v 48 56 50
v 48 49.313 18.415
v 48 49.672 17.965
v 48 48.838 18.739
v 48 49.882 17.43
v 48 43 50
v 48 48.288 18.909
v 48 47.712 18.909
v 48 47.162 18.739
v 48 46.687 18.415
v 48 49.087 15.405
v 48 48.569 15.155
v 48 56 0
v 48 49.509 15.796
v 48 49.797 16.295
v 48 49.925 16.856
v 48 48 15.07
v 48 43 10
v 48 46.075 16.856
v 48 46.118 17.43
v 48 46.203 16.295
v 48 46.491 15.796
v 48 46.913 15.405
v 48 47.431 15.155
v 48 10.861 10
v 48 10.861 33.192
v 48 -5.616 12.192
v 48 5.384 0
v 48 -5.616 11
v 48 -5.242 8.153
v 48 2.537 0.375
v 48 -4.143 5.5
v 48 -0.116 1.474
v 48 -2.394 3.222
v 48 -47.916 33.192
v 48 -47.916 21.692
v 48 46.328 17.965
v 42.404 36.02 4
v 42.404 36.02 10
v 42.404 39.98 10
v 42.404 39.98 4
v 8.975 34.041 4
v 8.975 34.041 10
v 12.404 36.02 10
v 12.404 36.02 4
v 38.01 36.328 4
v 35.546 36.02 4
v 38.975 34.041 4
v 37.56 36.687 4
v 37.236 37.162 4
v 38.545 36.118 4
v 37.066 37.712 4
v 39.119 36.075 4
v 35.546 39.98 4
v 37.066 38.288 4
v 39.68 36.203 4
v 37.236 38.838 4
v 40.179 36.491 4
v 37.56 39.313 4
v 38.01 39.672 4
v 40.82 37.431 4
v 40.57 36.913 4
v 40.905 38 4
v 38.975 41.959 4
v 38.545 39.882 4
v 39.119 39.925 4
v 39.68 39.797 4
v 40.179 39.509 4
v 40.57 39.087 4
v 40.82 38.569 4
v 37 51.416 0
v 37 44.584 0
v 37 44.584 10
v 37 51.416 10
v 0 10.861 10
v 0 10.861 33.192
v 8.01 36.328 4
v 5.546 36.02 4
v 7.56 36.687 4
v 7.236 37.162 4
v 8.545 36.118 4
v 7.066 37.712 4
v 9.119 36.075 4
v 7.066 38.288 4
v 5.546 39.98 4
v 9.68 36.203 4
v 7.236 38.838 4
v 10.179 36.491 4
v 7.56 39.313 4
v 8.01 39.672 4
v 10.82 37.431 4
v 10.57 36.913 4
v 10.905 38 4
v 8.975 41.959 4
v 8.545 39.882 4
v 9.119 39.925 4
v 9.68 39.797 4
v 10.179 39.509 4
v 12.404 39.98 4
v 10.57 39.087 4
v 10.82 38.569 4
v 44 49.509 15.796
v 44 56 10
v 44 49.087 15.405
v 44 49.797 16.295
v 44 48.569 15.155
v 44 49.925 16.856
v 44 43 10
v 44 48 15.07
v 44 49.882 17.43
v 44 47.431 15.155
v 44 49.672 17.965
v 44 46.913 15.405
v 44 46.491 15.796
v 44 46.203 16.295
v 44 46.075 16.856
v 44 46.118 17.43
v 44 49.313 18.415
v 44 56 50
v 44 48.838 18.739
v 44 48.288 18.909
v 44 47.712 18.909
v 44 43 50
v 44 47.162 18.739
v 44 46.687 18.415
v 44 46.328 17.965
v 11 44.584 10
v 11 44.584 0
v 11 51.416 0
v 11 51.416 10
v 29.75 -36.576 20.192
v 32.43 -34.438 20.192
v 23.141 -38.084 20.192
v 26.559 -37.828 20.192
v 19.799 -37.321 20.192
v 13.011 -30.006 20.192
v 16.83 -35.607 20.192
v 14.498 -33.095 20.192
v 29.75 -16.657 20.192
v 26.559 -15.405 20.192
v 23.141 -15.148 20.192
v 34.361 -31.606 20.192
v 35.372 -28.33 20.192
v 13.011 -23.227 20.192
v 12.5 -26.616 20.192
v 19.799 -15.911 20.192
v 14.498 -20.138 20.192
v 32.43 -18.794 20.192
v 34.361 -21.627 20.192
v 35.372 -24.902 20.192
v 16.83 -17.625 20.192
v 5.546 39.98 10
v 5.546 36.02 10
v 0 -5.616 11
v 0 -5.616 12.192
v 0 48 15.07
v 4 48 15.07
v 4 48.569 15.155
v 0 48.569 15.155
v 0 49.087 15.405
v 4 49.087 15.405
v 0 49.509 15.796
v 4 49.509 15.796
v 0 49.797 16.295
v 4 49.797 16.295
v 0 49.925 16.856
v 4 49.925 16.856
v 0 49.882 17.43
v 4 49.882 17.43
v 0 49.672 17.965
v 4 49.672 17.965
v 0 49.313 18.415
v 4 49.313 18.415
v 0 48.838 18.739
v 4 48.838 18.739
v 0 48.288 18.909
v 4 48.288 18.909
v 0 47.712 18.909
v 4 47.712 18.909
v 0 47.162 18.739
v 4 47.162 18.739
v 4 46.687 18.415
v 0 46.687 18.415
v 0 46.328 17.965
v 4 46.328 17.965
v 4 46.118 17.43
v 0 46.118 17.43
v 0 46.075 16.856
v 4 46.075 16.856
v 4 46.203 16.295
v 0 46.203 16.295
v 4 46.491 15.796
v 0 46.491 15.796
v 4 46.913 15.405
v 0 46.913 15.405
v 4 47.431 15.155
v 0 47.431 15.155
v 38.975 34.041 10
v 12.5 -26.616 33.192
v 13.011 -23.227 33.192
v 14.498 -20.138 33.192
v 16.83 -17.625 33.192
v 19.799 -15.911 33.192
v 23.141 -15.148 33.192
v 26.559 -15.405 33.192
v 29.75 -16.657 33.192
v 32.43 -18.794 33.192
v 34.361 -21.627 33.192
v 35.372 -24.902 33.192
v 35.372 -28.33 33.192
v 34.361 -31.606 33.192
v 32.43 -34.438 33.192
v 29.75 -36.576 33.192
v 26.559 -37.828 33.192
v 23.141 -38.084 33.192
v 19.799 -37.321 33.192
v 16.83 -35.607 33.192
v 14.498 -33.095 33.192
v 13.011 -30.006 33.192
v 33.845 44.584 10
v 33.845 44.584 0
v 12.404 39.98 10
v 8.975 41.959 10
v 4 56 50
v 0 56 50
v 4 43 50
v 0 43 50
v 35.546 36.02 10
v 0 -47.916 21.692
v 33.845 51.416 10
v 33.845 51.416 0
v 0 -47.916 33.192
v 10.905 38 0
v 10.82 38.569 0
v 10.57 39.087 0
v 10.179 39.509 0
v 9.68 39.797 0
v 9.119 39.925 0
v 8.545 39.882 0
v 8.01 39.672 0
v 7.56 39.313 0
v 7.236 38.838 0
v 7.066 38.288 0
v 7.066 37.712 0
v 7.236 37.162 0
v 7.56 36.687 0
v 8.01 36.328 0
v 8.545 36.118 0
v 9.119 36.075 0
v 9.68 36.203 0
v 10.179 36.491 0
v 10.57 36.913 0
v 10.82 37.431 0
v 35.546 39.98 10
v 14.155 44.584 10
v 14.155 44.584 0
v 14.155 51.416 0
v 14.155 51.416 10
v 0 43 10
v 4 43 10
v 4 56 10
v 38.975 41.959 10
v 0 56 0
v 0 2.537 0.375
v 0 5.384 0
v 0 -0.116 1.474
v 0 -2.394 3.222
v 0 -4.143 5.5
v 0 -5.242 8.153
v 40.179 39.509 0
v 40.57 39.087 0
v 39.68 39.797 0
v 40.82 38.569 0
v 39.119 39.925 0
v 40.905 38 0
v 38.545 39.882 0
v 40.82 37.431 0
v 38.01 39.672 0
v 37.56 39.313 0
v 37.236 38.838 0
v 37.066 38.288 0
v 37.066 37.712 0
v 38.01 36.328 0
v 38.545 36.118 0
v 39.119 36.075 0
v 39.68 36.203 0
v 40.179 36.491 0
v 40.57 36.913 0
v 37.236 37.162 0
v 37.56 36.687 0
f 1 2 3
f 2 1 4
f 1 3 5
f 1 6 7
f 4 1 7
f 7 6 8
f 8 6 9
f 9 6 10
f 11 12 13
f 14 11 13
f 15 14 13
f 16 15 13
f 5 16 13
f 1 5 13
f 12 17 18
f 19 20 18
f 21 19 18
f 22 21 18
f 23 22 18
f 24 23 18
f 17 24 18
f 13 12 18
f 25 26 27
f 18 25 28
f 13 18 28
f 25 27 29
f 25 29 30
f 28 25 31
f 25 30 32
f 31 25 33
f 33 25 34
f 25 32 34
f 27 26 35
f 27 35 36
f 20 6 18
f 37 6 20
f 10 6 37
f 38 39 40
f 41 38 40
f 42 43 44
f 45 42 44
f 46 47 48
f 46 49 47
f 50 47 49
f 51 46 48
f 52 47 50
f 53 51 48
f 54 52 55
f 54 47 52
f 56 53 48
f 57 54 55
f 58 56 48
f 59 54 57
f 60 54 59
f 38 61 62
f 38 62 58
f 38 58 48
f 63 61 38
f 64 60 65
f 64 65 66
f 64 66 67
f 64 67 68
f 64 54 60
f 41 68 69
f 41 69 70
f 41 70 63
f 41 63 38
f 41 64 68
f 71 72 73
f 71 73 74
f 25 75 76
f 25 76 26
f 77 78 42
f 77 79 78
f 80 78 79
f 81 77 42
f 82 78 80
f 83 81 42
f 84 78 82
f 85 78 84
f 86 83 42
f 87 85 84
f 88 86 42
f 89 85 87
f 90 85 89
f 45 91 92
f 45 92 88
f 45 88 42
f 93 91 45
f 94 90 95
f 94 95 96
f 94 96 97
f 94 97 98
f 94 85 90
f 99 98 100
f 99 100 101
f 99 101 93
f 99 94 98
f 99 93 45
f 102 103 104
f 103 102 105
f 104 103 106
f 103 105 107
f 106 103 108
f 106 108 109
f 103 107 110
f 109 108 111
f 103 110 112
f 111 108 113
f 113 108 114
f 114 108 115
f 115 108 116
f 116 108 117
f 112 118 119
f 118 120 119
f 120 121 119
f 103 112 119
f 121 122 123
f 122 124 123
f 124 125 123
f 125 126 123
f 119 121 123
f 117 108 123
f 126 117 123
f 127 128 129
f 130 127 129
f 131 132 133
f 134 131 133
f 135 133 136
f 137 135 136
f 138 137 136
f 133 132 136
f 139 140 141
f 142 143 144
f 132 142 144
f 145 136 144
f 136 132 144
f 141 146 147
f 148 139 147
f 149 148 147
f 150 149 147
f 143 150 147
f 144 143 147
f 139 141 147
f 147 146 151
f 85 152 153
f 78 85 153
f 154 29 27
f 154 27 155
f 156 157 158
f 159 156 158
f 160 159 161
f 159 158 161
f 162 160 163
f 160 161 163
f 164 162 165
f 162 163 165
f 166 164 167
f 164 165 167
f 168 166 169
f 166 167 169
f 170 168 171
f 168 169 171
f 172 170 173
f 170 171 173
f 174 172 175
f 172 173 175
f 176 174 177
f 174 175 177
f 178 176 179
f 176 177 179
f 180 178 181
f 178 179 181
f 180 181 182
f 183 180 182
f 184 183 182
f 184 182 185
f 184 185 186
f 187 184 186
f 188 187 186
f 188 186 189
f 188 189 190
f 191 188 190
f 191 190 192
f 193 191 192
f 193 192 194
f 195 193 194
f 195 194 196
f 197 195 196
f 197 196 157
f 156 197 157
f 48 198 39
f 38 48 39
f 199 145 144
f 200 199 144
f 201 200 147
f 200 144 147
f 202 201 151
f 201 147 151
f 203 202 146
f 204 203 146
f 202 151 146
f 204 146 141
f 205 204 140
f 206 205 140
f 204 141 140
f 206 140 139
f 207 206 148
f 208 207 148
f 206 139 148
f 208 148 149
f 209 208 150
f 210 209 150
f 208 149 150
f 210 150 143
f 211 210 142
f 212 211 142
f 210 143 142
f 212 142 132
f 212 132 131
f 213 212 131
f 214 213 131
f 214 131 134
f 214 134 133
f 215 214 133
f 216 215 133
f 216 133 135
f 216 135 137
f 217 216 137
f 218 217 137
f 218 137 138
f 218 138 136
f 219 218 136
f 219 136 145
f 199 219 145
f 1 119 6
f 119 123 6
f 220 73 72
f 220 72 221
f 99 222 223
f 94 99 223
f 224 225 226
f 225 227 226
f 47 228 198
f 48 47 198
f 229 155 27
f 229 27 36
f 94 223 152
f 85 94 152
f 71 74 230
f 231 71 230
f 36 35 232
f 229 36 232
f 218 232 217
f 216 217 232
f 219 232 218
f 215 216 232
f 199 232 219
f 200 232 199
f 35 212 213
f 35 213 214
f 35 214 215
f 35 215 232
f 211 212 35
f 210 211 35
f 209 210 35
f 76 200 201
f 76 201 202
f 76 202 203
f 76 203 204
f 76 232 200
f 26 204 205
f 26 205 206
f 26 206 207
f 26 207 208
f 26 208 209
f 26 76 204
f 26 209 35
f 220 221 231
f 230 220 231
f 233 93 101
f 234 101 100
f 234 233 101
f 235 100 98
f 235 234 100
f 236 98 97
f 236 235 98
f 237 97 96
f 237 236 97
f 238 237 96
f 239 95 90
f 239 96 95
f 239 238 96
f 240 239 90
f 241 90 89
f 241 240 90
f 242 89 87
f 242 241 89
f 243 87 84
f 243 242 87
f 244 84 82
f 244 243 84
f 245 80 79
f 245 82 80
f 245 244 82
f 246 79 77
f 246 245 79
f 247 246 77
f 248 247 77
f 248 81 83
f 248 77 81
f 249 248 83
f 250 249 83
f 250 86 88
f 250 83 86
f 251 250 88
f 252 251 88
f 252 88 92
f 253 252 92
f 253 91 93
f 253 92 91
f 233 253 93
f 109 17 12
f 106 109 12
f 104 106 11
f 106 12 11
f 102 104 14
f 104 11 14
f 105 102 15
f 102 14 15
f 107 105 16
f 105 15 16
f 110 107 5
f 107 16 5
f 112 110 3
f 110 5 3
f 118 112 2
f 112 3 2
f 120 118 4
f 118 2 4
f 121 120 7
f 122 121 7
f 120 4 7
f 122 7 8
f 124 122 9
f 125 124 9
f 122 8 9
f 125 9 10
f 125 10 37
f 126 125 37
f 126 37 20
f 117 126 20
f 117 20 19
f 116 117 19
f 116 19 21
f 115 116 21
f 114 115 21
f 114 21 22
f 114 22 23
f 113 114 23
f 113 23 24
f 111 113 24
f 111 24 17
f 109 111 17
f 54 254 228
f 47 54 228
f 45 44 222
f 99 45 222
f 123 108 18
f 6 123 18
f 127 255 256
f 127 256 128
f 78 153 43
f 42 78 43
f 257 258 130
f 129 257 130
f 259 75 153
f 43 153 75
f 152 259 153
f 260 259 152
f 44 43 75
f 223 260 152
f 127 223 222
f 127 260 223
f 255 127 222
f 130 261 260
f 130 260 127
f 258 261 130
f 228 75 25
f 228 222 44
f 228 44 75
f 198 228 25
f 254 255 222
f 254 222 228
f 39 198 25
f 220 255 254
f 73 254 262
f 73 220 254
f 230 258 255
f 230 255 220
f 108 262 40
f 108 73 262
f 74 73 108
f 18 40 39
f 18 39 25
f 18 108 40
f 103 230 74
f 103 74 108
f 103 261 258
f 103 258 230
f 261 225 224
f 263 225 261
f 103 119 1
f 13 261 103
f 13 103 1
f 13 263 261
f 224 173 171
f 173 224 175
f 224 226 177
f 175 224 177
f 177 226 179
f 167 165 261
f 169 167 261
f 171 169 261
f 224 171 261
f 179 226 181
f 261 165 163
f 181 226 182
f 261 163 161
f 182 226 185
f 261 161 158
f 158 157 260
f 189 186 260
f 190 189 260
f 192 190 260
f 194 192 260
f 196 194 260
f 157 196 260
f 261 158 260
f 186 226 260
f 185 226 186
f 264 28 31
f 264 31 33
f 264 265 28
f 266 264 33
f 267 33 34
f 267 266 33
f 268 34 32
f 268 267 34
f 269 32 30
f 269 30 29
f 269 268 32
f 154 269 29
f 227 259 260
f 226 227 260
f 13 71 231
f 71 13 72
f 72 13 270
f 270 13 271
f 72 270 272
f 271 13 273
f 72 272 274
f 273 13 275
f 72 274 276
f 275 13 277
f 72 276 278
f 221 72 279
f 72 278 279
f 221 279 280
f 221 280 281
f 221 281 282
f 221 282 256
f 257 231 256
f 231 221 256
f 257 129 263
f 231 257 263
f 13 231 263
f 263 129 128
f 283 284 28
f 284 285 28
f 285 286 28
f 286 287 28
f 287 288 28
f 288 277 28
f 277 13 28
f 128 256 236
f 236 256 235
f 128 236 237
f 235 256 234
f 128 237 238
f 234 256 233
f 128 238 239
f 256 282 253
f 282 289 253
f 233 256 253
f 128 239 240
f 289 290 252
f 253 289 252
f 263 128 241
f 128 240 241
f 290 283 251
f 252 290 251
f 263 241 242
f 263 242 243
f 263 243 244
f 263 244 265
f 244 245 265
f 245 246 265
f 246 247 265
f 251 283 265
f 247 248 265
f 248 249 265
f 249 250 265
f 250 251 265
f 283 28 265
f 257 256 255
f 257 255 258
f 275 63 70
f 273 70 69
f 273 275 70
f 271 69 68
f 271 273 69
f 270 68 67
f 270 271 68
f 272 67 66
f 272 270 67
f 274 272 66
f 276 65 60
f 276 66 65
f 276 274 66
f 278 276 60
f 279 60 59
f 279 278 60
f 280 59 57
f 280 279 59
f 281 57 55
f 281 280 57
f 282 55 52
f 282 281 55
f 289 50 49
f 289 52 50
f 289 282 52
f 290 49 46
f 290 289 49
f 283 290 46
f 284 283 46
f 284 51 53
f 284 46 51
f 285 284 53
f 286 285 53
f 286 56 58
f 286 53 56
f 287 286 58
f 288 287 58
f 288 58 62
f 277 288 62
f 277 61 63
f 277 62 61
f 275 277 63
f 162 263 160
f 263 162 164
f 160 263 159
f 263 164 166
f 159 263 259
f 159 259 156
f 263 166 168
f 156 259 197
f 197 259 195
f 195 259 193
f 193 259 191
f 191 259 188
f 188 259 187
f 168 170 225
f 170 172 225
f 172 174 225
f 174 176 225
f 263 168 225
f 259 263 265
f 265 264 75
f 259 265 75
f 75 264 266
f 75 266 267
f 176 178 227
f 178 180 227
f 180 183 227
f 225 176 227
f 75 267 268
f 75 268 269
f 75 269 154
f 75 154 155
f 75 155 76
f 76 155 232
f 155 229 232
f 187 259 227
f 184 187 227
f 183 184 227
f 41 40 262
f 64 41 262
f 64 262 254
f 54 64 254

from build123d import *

# Parameters (mm, degrees)
SKETCH1_W           = 48
SKETCH1_H           = 53
SKETCH1_R           = 1.9304
BOSS_EXTRUDE1_DEPTH = 10
SKETCH2_W           = 48
SKETCH2_H           = 5.616325
BOSS_EXTRUDE2_DEPTH = 33.1917878
SKETCH4_W           = 4
SKETCH4_H           = 10
BOSS_EXTRUDE4_DEPTH = 40
SKETCH5_W           = 48
SKETCH5_H           = 10.8609375
BOSS_EXTRUDE5_DEPTH = 23.1917878
SKETCH6_W           = 48
SKETCH6_H           = 5
BOSS_EXTRUDE6_DEPTH = 42.3
CUT_EXTRUDE1_REACH  = 78.862
SKETCH8_R           = 11.5
SKETCH9_R           = 1.9304
CUT_EXTRUDE2_DEPTH  = 88.252507127
CUT_EXTRUDE3_REACH  = 89.253
SKETCH10_W          = 3.15468
SKETCH10_H          = 6.8326
BOSS_EXTRUDE7_START = 8
SKETCH11_W          = 48
SKETCH11_H          = 42.3
SKETCH11_R          = 11.5
BOSS_EXTRUDE7_DEPTH = 8
SKETCH12_W          = 48
SKETCH12_H          = 42.3
BOSS_EXTRUDE8_DEPTH = 8
FILLET1_R           = 11
BOSS_EXTRUDE9_DEPTH = 3
CUT_EXTRUDE4_DEPTH  = 6
CUT_EXTRUDE5_DEPTH  = 90.10667764


with BuildPart() as part:
    # Sketch1 → Boss-Extrude1 (new body)
    with BuildSketch(Plane.XY):
        with Locations((24, 26.5)):
            Rectangle(SKETCH1_W, SKETCH1_H)
        with Locations((8.975, 38)):
            Circle(SKETCH1_R, mode=Mode.SUBTRACT)
        with Locations((38.975, 38)):
            Circle(SKETCH1_R, mode=Mode.SUBTRACT)
    extrude(amount=BOSS_EXTRUDE1_DEPTH)

    # Sketch2 → Boss-Extrude2 (add)
    with BuildSketch(Plane(origin=(0, 0, 0), x_dir=(-1, 0, 0), z_dir=(0, 0, -1))):
        with Locations((-24, -2.8081625)):
            Rectangle(SKETCH2_W, SKETCH2_H)
    extrude(amount=-BOSS_EXTRUDE2_DEPTH)

    # Sketch4 → Boss-Extrude4 (add)
    with BuildSketch(Plane.XY.offset(10)):
        with Locations((2, 48)):
            Rectangle(SKETCH4_W, SKETCH4_H)
        with Locations((46, 48)):
            Rectangle(SKETCH4_W, SKETCH4_H)
    extrude(amount=BOSS_EXTRUDE4_DEPTH)

    # Sketch5 → Boss-Extrude5 (add)
    with BuildSketch(Plane.XY.offset(10)):
        with Locations((24, 5.43046875)):
            Rectangle(SKETCH5_W, SKETCH5_H)
    extrude(amount=BOSS_EXTRUDE5_DEPTH)

    # Sketch6 → Boss-Extrude6 (add)
    with BuildSketch(Plane.XZ.offset(5.616325)):
        with Locations((24, 30.6917878)):
            Rectangle(SKETCH6_W, SKETCH6_H)
    extrude(amount=BOSS_EXTRUDE6_DEPTH)

    # Sketch8 → Cut-Extrude1 (cut, up to next)
    with BuildSketch(Plane(origin=(0, 0, 28.1917878), x_dir=(-1, 0, 0), z_dir=(0, 0, -1)), mode=Mode.PRIVATE) as cut_extrude1_sk1:
        with Locations((-24, -26.616325)):
            Circle(SKETCH8_R)
    cut_extrude1_tool1 = extrude(cut_extrude1_sk1.sketch, amount=-CUT_EXTRUDE1_REACH, mode=Mode.PRIVATE) & part.part
    add(cut_extrude1_tool1.solids().sort_by_distance((24, -26.616325, 28.191788))[0], mode=Mode.SUBTRACT)

    # Sketch9 → Cut-Extrude2 (cut, through all)
    with BuildSketch(Plane(origin=(48, 0, 0), x_dir=(0, 0, -1), z_dir=(1, 0, 0))):
        with Locations((-17, 48)):
            Circle(SKETCH9_R)
    extrude(amount=-CUT_EXTRUDE2_DEPTH, mode=Mode.SUBTRACT)

    # Sketch10 → Cut-Extrude3 (cut, up to next)
    with BuildSketch(Plane(origin=(0, 0, 0), x_dir=(-1, 0, 0), z_dir=(0, 0, -1)), mode=Mode.PRIVATE) as cut_extrude3_sk1:
        with Locations((-35.42266, 48)):
            Rectangle(SKETCH10_W, SKETCH10_H)
    cut_extrude3_tool1 = extrude(cut_extrude3_sk1.sketch, amount=-CUT_EXTRUDE3_REACH, mode=Mode.PRIVATE) & part.part
    # Sketch10 → Cut-Extrude3 (cut, up to next)
    with BuildSketch(Plane(origin=(0, 0, 0), x_dir=(-1, 0, 0), z_dir=(0, 0, -1)), mode=Mode.PRIVATE) as cut_extrude3_sk2:
        with Locations((-12.57734, 48)):
            Rectangle(SKETCH10_W, SKETCH10_H)
    cut_extrude3_tool2 = extrude(cut_extrude3_sk2.sketch, amount=-CUT_EXTRUDE3_REACH, mode=Mode.PRIVATE) & part.part
    add(cut_extrude3_tool1.solids().sort_by_distance((35.42266, 48, 0))[0], mode=Mode.SUBTRACT)
    add(cut_extrude3_tool2.solids().sort_by_distance((12.57734, 48, 0))[0], mode=Mode.SUBTRACT)

    # Sketch11 → Boss-Extrude7 (add)
    with BuildSketch(Plane(origin=(0, 0, 28.1917878), x_dir=(-1, 0, 0), z_dir=(0, 0, -1)).offset(BOSS_EXTRUDE7_START)):
        with Locations((-24, -26.766325)):
            Rectangle(SKETCH11_W, SKETCH11_H)
        with Locations((-24, -26.616325)):
            Circle(SKETCH11_R, mode=Mode.SUBTRACT)
    extrude(amount=-BOSS_EXTRUDE7_DEPTH)

    # Sketch12 → Boss-Extrude8 (add)
    with BuildSketch(Plane(origin=(0, 0, 20.1917878), x_dir=(-1, 0, 0), z_dir=(0, 0, -1))):
        with Locations((-24, -26.766325)):
            Rectangle(SKETCH12_W, SKETCH12_H)
    extrude(amount=BOSS_EXTRUDE8_DEPTH)

    # Fillet1
    fillet1_edges = [part.edges().sort_by_distance(p)[0] for p in [
        (24, -5.616325, 0),
    ]]
    fillet(fillet1_edges, radius=FILLET1_R)

    # Sketch13 → Boss-Extrude9 (add)
    with BuildSketch(Plane(origin=(0, 53, 0), x_dir=(1, 0, 0), z_dir=(0, 1, 0))):
        Polygon((0, 0), (0, -50), (4, -50), (4, -10), (44, -10), (44, -50), (48, -50), (48, 0), align=None)
    extrude(amount=BOSS_EXTRUDE9_DEPTH)

    # Sketch14 → Cut-Extrude4 (cut)
    with BuildSketch(Plane.XY.offset(10)):
        Polygon((8.975, 41.9594682), (5.545999953, 39.9797341), (5.545999953, 36.0202659), (8.975, 34.0405318), (12.404000047, 36.0202659), (12.404000047, 39.9797341), align=None)
        Polygon((38.975, 41.9594682), (35.545999953, 39.9797341), (35.545999953, 36.0202659), (38.975, 34.0405318), (42.404000047, 36.0202659), (42.404000047, 39.9797341), align=None)
    extrude(amount=-CUT_EXTRUDE4_DEPTH, mode=Mode.SUBTRACT)

    # Sketch15 → Cut-Extrude5 (cut, through all)
    with BuildSketch(Plane(origin=(48, 0, 0), x_dir=(0, 0, -1), z_dir=(1, 0, 0))):
        Polygon((-12.1917878, -5.616325), (-21.691694695, -47.916325), (-12.1917878, -47.916325), align=None)
    extrude(amount=-CUT_EXTRUDE5_DEPTH, mode=Mode.SUBTRACT)


solid = part.part
